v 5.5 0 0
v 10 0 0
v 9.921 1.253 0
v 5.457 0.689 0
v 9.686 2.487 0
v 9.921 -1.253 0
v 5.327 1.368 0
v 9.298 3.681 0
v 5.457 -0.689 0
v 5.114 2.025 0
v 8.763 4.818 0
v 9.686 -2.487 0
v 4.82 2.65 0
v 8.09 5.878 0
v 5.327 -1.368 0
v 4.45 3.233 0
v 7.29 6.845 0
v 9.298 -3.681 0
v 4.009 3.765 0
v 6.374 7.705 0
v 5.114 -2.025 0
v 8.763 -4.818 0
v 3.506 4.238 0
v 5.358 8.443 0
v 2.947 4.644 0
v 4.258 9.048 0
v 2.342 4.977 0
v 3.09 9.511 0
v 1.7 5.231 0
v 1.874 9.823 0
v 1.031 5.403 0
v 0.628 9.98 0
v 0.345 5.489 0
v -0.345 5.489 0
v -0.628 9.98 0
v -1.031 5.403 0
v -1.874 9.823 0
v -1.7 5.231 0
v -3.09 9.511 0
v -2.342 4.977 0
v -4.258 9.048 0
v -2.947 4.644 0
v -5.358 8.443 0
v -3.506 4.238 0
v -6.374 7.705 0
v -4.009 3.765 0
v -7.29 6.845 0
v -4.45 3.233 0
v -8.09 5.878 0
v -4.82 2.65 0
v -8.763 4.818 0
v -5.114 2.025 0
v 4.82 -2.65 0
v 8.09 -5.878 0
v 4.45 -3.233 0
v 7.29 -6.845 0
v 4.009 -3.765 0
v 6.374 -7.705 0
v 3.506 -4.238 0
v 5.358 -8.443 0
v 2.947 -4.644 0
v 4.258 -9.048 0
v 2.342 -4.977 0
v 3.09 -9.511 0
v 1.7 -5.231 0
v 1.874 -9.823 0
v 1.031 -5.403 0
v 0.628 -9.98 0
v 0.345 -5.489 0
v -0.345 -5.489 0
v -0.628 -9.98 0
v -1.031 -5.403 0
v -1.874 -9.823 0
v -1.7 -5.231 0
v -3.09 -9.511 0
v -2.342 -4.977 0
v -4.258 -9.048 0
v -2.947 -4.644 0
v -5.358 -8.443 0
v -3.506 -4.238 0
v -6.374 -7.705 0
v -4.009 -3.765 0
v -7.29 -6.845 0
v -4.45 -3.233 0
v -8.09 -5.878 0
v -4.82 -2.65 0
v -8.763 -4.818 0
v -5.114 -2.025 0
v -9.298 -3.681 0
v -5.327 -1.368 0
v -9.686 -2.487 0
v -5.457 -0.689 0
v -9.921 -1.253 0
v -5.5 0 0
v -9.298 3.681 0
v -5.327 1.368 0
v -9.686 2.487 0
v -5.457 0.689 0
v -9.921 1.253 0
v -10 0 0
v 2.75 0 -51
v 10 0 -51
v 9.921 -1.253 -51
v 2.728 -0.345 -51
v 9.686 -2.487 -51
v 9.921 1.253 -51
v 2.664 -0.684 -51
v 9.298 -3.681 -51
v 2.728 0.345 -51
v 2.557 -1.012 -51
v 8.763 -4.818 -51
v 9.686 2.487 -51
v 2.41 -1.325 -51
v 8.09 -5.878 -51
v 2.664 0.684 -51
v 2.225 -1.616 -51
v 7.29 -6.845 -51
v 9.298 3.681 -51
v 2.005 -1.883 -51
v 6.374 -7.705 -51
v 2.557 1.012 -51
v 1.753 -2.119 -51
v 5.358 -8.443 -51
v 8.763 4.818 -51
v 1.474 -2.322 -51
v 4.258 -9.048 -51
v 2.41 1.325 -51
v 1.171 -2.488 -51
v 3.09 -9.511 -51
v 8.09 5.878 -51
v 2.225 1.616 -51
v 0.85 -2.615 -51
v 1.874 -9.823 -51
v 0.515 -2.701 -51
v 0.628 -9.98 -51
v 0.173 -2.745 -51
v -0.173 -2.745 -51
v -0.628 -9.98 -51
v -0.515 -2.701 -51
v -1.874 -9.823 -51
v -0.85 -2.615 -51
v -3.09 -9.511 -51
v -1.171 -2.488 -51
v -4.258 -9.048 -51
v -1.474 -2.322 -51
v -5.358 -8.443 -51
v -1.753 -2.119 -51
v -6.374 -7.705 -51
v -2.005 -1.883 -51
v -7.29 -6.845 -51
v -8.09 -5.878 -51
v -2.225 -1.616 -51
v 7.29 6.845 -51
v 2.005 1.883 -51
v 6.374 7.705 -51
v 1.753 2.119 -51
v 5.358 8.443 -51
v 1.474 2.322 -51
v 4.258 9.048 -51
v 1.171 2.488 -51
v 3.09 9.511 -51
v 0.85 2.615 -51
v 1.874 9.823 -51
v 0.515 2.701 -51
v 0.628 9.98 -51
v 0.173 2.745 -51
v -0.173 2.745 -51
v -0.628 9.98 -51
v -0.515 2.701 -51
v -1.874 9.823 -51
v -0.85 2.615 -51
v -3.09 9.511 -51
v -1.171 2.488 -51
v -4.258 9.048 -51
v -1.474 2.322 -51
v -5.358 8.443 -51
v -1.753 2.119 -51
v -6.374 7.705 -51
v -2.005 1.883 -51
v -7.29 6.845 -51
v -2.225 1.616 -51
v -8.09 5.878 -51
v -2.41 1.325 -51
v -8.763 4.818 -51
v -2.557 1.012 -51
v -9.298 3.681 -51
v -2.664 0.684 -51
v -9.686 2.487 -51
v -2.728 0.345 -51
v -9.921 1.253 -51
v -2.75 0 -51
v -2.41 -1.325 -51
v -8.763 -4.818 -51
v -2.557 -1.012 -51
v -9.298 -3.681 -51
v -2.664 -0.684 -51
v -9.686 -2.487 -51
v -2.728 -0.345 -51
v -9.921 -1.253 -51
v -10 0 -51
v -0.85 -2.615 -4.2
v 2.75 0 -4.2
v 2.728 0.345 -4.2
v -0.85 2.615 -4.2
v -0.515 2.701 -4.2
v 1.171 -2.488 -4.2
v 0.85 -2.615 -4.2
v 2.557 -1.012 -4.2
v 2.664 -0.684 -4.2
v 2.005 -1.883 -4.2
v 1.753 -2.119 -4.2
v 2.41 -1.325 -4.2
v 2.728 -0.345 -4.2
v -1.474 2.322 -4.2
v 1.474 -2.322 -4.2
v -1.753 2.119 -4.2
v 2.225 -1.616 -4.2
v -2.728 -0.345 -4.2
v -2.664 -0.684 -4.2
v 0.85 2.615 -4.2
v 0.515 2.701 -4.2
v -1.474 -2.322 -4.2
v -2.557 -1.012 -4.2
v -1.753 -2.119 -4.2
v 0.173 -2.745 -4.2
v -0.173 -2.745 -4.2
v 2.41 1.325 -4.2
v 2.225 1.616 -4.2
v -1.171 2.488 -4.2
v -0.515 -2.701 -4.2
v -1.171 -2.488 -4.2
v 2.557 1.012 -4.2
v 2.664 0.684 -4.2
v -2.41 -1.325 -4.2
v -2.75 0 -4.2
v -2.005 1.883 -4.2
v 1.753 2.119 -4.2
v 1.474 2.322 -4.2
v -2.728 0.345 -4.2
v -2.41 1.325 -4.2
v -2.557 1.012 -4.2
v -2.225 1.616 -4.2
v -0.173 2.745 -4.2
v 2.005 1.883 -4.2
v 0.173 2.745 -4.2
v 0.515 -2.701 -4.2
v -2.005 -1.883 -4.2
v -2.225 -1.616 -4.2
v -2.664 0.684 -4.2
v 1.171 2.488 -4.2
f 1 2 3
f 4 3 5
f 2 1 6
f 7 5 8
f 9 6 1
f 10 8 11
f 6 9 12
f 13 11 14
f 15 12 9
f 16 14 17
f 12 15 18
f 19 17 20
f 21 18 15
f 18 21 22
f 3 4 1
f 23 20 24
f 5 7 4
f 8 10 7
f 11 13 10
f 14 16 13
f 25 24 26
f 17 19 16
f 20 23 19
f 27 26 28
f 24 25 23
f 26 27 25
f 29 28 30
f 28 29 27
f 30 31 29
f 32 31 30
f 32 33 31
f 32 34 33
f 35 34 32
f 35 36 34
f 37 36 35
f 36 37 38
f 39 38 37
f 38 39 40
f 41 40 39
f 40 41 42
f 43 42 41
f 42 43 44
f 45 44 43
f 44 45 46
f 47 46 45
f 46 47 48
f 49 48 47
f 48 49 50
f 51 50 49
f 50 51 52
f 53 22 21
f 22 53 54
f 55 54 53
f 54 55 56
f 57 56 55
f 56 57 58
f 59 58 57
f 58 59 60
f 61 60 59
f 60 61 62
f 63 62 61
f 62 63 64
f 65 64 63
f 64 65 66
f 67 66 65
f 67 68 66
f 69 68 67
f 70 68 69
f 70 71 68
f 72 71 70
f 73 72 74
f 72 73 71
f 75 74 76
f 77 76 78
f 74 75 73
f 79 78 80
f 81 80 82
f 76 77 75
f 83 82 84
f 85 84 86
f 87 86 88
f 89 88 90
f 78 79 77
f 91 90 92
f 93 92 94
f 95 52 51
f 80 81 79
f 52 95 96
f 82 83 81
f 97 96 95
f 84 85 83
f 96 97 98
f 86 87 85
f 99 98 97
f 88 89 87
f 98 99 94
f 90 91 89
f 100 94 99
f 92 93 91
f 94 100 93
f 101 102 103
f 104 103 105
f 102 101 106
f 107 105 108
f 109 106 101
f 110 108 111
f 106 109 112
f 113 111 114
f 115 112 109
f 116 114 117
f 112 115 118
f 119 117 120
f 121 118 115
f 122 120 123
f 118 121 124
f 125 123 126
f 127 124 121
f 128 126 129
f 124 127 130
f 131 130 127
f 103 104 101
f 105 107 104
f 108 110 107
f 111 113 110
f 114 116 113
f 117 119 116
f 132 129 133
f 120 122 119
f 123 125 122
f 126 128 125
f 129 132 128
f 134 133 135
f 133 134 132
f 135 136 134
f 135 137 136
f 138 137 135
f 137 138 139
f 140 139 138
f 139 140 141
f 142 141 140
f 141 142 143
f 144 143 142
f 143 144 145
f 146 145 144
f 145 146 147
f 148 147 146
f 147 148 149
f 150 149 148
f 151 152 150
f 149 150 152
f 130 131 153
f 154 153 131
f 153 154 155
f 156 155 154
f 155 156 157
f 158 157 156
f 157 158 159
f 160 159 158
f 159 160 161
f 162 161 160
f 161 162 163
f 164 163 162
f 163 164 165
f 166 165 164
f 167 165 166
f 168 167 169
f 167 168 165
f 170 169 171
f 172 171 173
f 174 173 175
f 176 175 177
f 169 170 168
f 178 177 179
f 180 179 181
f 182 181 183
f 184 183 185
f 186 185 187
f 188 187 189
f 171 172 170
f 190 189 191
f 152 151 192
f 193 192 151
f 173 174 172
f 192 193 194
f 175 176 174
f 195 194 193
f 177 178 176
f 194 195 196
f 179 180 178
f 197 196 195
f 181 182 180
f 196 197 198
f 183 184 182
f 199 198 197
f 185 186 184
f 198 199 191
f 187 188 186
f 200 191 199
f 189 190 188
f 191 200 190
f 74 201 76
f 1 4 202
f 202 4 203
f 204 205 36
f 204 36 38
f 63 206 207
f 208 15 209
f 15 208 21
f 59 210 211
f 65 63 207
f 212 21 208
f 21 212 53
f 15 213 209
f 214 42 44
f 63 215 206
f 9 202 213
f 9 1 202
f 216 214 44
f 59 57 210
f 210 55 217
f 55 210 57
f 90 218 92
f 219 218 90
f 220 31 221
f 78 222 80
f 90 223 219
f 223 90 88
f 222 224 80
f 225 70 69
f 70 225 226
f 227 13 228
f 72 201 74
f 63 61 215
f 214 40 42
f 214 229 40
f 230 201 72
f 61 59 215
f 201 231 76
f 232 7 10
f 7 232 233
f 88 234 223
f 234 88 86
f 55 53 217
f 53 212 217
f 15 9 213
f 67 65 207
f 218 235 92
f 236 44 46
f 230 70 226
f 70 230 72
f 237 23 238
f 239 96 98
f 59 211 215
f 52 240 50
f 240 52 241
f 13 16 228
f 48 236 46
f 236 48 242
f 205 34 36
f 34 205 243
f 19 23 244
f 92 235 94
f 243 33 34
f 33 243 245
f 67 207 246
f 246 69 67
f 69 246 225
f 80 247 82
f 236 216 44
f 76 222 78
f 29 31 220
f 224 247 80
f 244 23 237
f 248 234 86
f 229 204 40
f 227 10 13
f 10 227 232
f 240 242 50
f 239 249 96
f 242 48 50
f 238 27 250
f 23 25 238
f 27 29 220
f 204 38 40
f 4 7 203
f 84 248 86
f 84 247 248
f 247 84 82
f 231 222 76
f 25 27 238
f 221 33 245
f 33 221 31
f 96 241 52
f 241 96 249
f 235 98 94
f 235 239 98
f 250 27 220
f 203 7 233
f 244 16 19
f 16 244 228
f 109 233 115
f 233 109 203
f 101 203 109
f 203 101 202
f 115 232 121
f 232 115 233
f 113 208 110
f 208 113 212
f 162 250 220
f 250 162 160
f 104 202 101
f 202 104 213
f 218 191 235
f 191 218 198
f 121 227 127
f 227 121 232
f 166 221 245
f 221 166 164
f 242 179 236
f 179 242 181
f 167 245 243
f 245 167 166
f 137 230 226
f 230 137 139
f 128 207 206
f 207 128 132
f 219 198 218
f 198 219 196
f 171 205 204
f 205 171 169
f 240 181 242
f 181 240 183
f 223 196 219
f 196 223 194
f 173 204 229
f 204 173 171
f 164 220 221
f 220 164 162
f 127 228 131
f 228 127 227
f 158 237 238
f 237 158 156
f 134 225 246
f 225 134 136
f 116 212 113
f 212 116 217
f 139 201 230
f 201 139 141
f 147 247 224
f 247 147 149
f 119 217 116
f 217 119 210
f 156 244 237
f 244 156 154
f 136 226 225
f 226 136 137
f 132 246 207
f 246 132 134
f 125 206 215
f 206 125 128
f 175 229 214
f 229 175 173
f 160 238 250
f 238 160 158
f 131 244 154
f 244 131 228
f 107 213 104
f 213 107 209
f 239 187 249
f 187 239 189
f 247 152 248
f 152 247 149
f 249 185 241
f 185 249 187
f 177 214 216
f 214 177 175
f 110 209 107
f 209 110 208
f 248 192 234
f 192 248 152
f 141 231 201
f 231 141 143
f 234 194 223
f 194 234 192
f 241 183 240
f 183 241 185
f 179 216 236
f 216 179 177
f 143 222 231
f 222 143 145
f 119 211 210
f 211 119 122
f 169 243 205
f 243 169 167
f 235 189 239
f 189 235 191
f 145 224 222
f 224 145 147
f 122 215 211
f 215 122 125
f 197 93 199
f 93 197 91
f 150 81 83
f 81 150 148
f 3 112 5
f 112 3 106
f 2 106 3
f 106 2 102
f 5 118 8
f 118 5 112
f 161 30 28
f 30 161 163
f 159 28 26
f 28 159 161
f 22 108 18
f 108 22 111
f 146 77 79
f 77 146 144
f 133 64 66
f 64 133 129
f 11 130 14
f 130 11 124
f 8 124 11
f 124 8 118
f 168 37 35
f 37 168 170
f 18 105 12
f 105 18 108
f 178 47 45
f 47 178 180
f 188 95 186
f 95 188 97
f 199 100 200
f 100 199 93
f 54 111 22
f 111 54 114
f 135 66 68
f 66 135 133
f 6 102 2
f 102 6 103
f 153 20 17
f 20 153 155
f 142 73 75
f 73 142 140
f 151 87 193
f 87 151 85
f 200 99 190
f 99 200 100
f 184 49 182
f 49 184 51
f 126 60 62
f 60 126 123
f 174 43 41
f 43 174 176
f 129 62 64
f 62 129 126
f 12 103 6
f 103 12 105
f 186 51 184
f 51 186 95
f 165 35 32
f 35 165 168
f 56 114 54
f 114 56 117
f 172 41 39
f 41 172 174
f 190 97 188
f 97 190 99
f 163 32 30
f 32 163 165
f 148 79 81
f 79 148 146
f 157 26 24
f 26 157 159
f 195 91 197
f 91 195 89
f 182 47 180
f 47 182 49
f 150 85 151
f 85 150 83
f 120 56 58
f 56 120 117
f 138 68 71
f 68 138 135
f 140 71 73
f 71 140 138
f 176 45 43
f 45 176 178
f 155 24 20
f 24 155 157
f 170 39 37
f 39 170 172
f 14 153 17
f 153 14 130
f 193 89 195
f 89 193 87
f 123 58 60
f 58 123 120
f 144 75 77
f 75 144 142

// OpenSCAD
$fn = 50;


difference() {
	union() {
		translate(v = [0, 0, -51.0000000000]) {
			cylinder(h = 51, r = 10.0000000000);
		}
	}
	union() {
		translate(v = [0, 0, 0]) {
			rotate(a = [0, 0, 0]) {
				difference() {
					union() {
						#translate(v = [0, 0, -51.0000000000]) {
							cylinder(h = 51, r = 2.2500000000);
						}
						#translate(v = [0, 0, -4.2000000000]) {
							cylinder(h = 4.2000000000, r = 10.0000000000, r1 = 2.7500000000, r2 = 5.5000000000);
						}
						#translate(v = [0, 0, -51.0000000000]) {
							cylinder(h = 51, r = 2.7500000000);
						}
						#translate(v = [0, 0, -51.0000000000]) {
							cylinder(h = 51, r = 2.2500000000);
						}
					}
					union();
				}
			}
		}
	}
}
